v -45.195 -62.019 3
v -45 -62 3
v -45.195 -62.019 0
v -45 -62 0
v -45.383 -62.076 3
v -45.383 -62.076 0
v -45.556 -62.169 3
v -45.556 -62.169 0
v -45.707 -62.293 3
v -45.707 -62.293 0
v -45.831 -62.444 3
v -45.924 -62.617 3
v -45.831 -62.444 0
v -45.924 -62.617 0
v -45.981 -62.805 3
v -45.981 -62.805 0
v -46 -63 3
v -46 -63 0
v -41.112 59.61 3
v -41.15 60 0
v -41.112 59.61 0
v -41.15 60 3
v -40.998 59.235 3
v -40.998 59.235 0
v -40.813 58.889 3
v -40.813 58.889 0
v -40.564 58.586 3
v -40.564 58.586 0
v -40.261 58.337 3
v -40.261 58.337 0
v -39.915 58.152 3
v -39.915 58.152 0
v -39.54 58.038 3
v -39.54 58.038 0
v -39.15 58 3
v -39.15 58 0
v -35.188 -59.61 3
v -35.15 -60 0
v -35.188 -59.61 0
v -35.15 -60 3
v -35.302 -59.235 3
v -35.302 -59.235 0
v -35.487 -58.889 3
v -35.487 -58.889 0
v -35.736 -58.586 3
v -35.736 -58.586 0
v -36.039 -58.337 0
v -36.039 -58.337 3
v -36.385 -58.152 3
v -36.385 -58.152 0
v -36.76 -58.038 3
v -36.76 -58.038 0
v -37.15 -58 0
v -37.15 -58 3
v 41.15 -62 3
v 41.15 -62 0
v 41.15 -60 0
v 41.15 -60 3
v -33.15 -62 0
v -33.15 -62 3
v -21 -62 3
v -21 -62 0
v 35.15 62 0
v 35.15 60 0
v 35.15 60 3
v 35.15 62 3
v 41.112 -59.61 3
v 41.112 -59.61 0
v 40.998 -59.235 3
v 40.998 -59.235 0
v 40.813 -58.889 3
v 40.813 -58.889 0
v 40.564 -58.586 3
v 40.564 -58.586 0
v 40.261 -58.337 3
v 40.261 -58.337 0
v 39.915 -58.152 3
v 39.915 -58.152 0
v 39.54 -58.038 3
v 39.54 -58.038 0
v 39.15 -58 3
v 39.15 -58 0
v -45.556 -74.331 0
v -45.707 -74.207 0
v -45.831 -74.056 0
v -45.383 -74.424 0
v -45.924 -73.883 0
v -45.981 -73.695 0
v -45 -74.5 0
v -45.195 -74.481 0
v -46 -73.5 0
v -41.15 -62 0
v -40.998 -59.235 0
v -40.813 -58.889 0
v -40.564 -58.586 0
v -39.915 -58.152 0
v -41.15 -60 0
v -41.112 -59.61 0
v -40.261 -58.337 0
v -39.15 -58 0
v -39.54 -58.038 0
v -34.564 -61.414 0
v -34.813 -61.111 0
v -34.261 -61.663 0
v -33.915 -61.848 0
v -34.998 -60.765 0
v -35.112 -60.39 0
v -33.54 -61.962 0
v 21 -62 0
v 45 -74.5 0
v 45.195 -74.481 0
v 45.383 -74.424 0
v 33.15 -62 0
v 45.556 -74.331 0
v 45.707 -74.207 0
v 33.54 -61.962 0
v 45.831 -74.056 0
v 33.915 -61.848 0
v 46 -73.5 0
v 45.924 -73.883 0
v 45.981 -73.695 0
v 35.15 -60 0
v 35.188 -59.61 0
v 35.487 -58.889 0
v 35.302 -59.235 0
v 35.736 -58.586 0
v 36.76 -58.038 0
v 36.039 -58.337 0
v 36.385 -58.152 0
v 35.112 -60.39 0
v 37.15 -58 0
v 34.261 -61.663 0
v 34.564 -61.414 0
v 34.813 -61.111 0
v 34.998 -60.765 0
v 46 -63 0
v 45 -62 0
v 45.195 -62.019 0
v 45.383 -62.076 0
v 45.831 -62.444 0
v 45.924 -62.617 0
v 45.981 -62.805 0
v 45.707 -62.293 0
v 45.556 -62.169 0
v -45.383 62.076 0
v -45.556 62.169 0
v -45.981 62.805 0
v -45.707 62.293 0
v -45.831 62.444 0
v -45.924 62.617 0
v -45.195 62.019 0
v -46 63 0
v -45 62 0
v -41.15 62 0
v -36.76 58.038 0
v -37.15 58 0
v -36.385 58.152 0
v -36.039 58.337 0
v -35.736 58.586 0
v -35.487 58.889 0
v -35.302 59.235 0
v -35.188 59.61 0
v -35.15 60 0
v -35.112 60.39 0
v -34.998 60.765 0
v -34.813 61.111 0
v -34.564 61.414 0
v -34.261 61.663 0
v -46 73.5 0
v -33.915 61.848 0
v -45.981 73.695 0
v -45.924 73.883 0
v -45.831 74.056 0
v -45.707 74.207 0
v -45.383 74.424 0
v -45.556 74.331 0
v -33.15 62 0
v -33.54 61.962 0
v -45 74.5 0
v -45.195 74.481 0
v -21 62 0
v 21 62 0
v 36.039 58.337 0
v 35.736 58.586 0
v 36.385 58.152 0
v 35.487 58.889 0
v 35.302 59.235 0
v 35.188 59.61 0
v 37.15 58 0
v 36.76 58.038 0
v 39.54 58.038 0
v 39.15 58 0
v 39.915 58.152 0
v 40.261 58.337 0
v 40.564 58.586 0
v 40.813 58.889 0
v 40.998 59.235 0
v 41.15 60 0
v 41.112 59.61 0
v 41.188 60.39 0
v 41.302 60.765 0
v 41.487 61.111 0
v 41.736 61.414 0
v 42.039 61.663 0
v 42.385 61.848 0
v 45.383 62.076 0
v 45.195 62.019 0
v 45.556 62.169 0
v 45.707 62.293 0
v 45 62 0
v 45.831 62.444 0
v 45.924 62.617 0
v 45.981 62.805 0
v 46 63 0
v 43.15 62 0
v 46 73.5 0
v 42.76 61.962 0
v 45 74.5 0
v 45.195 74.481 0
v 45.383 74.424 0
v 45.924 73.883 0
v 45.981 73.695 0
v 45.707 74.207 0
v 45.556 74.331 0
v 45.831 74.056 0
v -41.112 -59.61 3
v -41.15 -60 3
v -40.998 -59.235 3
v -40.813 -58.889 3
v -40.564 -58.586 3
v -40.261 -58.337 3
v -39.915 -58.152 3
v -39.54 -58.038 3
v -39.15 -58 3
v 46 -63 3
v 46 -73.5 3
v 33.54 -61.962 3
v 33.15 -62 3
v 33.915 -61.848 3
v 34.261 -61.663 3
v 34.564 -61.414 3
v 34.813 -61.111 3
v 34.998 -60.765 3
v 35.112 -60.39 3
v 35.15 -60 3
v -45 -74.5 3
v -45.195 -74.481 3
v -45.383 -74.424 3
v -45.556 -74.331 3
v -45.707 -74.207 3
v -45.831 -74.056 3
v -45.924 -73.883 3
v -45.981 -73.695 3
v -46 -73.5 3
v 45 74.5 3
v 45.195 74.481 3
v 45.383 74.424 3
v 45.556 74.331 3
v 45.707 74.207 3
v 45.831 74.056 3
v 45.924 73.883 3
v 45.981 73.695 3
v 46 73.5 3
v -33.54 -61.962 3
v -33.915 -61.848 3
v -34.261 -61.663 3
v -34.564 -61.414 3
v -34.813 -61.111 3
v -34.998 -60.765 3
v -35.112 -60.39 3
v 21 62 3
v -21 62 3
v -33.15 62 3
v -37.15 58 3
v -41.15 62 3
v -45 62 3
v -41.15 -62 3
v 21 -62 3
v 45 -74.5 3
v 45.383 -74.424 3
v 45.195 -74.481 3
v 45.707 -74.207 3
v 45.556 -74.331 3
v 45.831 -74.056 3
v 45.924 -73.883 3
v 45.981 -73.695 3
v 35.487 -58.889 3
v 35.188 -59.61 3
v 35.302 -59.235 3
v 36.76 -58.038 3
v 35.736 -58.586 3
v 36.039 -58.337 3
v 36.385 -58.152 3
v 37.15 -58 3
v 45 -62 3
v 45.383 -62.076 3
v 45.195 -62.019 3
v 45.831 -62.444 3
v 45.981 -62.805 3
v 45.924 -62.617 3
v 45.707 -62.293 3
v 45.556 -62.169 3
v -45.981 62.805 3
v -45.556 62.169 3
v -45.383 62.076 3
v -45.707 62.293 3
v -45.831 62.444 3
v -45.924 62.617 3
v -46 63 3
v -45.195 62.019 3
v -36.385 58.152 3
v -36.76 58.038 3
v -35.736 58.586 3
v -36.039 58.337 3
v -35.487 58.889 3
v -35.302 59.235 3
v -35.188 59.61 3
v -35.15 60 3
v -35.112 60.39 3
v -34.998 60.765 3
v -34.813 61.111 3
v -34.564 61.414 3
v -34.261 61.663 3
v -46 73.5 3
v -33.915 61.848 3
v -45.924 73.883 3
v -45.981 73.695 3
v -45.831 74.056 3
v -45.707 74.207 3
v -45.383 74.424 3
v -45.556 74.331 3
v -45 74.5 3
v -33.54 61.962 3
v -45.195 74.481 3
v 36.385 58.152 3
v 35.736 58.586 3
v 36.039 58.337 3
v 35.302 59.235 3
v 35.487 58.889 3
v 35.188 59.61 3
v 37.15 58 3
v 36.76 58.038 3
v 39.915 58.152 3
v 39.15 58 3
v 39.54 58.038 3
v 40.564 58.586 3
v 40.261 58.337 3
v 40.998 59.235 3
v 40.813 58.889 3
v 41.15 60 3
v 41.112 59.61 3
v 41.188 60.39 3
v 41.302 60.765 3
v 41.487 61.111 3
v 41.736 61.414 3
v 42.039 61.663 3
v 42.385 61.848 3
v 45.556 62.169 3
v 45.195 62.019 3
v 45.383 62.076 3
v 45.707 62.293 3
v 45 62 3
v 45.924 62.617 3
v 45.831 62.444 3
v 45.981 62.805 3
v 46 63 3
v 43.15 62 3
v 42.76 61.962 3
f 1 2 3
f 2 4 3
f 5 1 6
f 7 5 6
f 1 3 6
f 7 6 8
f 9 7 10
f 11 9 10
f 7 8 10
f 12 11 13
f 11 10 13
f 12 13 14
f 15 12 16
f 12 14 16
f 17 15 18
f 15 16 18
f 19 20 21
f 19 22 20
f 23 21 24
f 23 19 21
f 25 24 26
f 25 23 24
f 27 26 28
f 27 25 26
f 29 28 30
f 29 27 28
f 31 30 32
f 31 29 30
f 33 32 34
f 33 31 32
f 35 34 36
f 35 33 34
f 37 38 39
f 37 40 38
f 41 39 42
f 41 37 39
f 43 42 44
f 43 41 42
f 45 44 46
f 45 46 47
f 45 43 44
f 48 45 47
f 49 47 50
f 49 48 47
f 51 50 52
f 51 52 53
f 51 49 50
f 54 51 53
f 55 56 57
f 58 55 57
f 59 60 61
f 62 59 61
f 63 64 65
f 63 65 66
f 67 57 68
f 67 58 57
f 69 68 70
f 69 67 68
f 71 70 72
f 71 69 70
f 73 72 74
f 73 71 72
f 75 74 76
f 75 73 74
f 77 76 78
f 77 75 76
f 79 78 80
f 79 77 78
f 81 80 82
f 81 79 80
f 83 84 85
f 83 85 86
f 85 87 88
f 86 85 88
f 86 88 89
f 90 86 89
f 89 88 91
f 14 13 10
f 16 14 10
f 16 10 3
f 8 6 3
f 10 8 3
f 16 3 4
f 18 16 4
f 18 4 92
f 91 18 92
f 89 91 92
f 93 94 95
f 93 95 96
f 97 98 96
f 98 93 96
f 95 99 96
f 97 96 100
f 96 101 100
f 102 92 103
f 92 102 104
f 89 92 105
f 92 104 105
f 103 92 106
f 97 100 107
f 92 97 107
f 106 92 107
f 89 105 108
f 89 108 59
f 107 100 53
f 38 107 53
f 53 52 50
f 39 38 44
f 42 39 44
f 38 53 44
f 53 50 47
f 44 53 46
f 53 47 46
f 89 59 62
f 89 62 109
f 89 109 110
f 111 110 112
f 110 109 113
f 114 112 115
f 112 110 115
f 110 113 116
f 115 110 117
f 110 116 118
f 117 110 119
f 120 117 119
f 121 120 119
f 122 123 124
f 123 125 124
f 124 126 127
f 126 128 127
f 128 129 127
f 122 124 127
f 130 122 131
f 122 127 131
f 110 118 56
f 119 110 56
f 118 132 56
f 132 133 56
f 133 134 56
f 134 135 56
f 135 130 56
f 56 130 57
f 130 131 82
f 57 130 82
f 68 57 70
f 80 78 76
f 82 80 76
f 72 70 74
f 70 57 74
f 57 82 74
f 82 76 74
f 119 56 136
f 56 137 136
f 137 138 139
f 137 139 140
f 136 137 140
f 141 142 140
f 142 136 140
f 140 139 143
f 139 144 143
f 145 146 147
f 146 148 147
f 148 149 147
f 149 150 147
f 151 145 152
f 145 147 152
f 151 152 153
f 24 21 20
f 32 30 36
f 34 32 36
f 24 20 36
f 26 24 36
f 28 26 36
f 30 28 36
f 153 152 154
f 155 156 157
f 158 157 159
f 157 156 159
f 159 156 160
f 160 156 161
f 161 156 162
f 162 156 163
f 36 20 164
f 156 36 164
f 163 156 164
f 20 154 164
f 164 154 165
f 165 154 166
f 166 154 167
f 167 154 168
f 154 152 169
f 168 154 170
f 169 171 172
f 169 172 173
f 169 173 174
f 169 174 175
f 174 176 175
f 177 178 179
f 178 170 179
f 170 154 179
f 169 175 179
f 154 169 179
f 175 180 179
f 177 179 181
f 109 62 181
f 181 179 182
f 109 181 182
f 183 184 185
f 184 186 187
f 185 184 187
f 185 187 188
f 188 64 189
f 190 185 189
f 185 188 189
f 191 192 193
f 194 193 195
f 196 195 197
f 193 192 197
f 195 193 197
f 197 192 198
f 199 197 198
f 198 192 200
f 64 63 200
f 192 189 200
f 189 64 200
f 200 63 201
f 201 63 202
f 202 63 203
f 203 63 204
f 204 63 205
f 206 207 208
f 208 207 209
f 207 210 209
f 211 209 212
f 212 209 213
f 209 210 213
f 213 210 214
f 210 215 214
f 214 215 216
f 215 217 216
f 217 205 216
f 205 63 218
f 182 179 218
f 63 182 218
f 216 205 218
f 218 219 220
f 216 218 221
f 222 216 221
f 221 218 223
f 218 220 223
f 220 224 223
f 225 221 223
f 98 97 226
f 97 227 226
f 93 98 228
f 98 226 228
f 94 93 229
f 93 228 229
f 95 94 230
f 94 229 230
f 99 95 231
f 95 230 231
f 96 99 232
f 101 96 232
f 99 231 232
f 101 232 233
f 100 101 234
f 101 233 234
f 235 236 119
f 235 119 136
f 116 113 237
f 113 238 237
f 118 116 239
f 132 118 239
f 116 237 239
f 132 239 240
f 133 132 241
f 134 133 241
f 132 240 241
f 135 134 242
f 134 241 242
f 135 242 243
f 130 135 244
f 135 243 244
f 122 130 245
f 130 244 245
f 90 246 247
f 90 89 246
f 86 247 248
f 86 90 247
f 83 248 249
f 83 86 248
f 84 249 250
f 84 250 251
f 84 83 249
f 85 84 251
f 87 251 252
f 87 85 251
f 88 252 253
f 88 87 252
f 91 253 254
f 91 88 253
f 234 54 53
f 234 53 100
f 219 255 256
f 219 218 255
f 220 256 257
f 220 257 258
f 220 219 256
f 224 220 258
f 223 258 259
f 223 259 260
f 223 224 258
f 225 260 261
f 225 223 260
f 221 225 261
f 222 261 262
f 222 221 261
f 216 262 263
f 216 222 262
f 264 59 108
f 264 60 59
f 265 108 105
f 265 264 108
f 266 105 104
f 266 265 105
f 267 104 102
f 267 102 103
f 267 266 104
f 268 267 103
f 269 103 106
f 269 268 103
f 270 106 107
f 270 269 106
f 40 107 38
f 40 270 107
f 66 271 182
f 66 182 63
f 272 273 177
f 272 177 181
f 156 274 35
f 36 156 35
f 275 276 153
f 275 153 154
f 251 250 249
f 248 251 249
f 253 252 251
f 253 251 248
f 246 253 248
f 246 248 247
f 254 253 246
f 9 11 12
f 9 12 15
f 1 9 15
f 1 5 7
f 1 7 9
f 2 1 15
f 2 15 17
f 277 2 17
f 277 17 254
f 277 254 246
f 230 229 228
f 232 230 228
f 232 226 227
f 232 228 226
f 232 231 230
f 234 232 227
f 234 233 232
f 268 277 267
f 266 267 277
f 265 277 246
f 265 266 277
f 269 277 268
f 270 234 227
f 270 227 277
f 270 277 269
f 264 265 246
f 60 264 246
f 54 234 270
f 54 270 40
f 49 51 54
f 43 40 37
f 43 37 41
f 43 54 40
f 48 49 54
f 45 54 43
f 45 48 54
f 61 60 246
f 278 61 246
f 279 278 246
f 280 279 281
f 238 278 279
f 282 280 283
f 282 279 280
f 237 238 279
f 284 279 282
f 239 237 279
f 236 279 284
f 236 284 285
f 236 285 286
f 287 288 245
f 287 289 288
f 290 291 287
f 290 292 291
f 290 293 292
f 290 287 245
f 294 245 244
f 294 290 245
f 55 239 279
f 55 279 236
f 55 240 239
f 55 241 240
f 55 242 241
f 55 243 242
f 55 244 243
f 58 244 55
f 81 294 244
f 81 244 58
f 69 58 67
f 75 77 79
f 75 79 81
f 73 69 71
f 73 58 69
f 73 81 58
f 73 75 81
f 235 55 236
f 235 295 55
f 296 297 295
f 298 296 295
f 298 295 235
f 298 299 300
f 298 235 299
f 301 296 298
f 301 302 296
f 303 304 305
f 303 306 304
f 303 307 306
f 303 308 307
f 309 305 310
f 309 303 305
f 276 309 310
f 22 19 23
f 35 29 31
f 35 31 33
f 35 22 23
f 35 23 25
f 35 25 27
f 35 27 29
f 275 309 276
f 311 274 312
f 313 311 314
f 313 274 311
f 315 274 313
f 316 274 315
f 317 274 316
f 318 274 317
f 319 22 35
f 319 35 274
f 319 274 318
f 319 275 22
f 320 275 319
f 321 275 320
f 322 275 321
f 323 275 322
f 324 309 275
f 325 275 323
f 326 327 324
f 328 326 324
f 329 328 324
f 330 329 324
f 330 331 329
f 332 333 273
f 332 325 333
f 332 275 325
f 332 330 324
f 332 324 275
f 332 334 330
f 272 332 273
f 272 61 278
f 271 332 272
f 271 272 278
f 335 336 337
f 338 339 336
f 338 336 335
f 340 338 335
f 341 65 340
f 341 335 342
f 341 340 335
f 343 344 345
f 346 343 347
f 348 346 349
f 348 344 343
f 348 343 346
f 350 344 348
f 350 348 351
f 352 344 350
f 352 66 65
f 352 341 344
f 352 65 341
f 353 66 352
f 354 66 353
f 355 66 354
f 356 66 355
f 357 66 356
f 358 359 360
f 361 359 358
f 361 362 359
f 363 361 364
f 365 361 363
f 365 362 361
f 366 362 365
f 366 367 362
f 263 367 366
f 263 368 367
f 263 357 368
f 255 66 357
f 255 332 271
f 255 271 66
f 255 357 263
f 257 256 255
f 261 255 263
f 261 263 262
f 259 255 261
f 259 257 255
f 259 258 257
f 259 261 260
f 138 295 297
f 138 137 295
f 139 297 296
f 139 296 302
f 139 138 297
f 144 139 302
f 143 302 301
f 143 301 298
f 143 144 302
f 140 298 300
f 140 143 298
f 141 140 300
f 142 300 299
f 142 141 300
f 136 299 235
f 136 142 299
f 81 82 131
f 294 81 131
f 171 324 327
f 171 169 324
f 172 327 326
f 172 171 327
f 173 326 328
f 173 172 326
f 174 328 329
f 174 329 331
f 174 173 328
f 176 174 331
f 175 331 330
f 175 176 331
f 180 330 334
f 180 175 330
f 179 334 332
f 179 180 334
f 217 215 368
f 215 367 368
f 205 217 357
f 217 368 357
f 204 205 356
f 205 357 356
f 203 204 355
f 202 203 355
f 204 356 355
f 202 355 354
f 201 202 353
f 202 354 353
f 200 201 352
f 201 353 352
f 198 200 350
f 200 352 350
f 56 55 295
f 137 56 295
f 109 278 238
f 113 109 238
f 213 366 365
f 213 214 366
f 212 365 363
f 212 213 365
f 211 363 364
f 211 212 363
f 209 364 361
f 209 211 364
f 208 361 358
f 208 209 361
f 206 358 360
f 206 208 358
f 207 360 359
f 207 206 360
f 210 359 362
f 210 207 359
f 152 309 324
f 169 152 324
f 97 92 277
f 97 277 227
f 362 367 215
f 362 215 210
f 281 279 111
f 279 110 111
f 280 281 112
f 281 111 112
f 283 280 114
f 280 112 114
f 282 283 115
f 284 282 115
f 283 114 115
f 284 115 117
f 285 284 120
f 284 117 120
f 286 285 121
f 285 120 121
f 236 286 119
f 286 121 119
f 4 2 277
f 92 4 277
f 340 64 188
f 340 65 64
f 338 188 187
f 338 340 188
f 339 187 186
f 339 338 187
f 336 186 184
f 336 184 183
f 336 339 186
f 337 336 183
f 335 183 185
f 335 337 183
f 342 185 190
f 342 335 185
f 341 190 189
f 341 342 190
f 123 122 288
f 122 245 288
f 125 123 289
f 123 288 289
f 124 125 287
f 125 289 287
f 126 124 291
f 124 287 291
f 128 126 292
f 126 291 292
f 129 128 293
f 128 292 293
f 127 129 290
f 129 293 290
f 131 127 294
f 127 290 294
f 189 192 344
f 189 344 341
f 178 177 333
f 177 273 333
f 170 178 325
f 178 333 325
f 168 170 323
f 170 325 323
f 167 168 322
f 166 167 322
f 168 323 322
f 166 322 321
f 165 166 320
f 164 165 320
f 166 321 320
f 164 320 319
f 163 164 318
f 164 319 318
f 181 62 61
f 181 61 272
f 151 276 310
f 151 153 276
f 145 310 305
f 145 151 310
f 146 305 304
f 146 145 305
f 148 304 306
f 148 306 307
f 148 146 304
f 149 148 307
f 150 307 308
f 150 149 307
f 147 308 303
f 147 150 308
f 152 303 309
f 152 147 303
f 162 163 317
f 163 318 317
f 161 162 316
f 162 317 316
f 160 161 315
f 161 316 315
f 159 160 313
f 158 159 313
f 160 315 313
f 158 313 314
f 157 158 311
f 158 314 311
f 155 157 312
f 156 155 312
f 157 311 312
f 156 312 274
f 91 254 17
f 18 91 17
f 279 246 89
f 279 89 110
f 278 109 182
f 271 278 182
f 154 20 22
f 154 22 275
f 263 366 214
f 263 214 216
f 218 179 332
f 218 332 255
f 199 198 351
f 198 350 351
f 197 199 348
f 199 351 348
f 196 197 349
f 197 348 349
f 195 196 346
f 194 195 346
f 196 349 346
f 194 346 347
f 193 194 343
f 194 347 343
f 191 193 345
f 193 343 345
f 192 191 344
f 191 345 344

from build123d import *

# Parameters (mm, degrees)
SKETCH_1_W      = 42
SKETCH_1_H      = 149
EXTRUDE_1_DEPTH = 3
SKETCH_2_W      = 25
SKETCH_2_H      = 12.5
EXTRUDE_2_DEPTH = 3
FILLET_1_R      = 1
SKETCH_3_W      = 6
SKETCH_3_H      = 4
EXTRUDE_3_DEPTH = 3
FILLET_2_R      = 2


with BuildPart() as part:
    # 草图1 → 凸台-拉伸1 (new body)
    with BuildSketch(Plane.XY):
        Rectangle(SKETCH_1_W, SKETCH_1_H)
    extrude(amount=EXTRUDE_1_DEPTH)

    # 草图2 → 凸台-拉伸2 (add)
    with BuildSketch(Plane.XY.offset(3)):
        with Locations((33.5, -68.25)):
            Rectangle(SKETCH_2_W, SKETCH_2_H)
        with Locations((-33.5, -68.25)):
            Rectangle(SKETCH_2_W, SKETCH_2_H)
        with Locations((-33.5, 68.25)):
            Rectangle(SKETCH_2_W, SKETCH_2_H)
        with Locations((33.5, 68.25)):
            Rectangle(SKETCH_2_W, SKETCH_2_H)
    extrude(amount=-EXTRUDE_2_DEPTH)

    # 圆角1
    fillet_1_edges = [part.edges().sort_by_distance(p)[0] for p in [
        (46, -74.5, 1.5),
        (46, -62, 1.5),
        (-46, -62, 1.5),
        (-46, -74.5, 1.5),
        (-46, 74.5, 1.5),
        (-46, 62, 1.5),
        (46, 62, 1.5),
        (46, 74.5, 1.5),
    ]]
    fillet(fillet_1_edges, radius=FILLET_1_R)

    # 草图3 → 凸台-拉伸3 (add)
    with BuildSketch(Plane(origin=(0, 0, 0), x_dir=(-1, 0, 0), z_dir=(0, 0, -1))):
        with Locations((38.15, 60)):
            Rectangle(SKETCH_3_W, SKETCH_3_H)
        with Locations((-38.15, 60)):
            Rectangle(SKETCH_3_W, SKETCH_3_H)
        with Locations((-38.15, -60)):
            Rectangle(SKETCH_3_W, SKETCH_3_H)
        with Locations((38.15, -60)):
            Rectangle(SKETCH_3_W, SKETCH_3_H)
    extrude(amount=-EXTRUDE_3_DEPTH)

    # 圆角2
    fillet_2_edges = [part.edges().sort_by_distance(p)[0] for p in [
        (-41.15, -58, 1.5),
        (-35.15, -58, 1.5),
        (-35.15, -62, 1.5),
        (41.15, -58, 1.5),
        (35.15, -62, 1.5),
        (35.15, -58, 1.5),
        (35.15, 58, 1.5),
        (41.15, 58, 1.5),
        (-35.15, 58, 1.5),
        (-35.15, 62, 1.5),
        (-41.15, 58, 1.5),
        (41.15, 62, 1.5),
    ]]
    fillet(fillet_2_edges, radius=FILLET_2_R - 0.0001)  # a hair under: the kernel refuses the full size


solid = part.part
